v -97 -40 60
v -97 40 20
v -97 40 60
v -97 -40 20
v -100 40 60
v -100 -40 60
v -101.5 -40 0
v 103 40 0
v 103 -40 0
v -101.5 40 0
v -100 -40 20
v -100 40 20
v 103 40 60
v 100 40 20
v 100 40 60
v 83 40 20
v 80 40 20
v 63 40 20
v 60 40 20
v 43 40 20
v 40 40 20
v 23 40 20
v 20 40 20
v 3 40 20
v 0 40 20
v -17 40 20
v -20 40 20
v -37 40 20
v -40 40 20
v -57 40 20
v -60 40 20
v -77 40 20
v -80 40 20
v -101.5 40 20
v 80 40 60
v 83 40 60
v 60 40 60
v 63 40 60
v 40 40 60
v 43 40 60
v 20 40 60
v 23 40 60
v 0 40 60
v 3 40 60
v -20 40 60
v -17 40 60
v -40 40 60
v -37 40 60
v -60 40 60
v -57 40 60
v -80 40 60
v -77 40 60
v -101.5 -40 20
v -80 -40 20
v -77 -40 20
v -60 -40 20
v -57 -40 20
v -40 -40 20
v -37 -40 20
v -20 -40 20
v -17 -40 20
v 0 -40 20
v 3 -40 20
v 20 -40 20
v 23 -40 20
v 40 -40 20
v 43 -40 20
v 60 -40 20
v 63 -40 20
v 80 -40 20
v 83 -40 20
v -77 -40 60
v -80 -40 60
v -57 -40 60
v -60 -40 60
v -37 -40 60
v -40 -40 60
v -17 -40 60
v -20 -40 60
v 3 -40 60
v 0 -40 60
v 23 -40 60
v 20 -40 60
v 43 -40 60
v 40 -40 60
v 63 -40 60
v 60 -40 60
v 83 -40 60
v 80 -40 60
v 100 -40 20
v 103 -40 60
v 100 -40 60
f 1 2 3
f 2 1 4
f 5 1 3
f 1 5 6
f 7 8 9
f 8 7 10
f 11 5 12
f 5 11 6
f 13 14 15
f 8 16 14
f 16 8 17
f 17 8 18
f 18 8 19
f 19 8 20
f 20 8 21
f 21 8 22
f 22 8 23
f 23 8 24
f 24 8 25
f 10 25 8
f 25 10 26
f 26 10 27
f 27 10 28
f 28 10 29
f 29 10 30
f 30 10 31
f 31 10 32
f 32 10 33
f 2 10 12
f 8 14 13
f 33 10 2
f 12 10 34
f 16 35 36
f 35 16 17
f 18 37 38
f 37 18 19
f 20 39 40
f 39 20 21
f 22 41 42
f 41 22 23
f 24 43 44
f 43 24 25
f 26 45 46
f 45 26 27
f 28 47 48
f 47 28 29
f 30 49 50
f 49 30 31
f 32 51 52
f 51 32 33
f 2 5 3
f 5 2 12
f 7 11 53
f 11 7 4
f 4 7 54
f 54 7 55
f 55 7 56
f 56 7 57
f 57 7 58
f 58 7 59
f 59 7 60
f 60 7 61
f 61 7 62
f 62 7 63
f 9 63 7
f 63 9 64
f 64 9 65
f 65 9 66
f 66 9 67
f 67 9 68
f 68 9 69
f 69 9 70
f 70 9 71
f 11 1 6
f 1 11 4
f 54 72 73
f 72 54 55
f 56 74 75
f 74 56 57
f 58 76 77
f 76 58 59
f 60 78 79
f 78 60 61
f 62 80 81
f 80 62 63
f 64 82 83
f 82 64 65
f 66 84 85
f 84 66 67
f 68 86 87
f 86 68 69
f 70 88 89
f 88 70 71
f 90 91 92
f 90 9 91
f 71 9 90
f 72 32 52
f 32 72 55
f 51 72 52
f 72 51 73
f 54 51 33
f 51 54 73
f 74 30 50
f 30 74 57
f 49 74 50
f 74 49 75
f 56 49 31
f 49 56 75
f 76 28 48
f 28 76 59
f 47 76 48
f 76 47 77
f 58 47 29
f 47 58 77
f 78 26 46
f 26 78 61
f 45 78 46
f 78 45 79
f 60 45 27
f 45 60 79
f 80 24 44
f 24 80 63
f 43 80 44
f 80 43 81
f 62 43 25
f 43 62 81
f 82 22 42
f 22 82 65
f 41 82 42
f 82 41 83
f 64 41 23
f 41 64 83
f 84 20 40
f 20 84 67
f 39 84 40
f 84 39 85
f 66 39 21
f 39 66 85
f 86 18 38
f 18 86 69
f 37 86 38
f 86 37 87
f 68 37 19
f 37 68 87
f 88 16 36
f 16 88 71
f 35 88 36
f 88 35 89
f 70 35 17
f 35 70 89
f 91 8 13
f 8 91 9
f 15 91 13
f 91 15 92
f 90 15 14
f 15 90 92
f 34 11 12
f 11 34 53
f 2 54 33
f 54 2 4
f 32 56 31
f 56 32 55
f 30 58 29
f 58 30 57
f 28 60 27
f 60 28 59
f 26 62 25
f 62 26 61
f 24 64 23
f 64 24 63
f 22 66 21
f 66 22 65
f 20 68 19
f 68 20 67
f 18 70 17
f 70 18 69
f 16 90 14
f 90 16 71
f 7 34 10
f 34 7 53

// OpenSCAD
// Petri Dish Rack
// Designed for 90mm diameter dishes standing on edge.

// --- Dimensions ---
base_l      = 203.0;  // Length of base (X)
base_w      = 80.0;   // Width of base (Y)
base_h      = 20.0;   // Height of base (Z)

dish_radius = 45.0;   // Radius of 90mm dish
cradle_r    = 46.0;   // Radius of the cutting cylinder
cradle_z    = 52.0;   // Z-offset of the cylinder axis (bottoms at 52-46=6mm)

num_dividers = 11;     // Number of vertical plates
divider_t    = 3.0;    // Thickness of each divider (X)
divider_h    = 60.0;   // Height of dividers (Z)
divider_w    = 80.0;   // Width of dividers (Y)

// Spacing calculation: 
// 11 dividers create 10 slots. 
// Total length covered by dividers is from -100 to 100.
// The user specified x = -100, -80, ..., 100.
x_start      = -100.0;
x_end        = 100.0;
x_step       = 20.0;

$fn = 128;

// --- Modeling ---

// The base block
module base() {
    translate([-base_l/2, -base_w/2, 0])
        cube([base_l, base_w, base_h]);
}

// The vertical dividers
module dividers() {
    for (i = [0 : num_dividers - 1]) {
        x_pos = x_start + (i * x_step);
        translate([x_pos, -divider_w/2, 0])
            cube([divider_t, divider_w, divider_h]);
    }
}

// The cradle (the curved groove)
// The axis runs along X at y=0, z=52.
// We use a large cylinder to cut the groove.
module cradle_cutter() {
    // We rotate the cylinder to lie along the X axis.
    // The cylinder is centered at y=0, z=52.
    // To use difference, we make it longer than the base.
    translate([0, 0, cradle_z])
        rotate([0, 90, 0])
            cylinder(h = base_l + 2, d = cradle_r * 2);
}

// Final Assembly
union() {
    // The base and dividers are joined
    union() {
        base();
        dividers();
    }
    
    // We use a difference to cut the cradle out of the combined base/dividers
    // However, the prompt says "the cradle is not cut through them" 
    // regarding the dividers, but "A curved cradle... is cut along its whole length".
    // This implies the cradle is a feature of the base, but the dividers 
    // are solid and rise through the cradle area.
    // To achieve "cradle is not cut through them", we must subtract the cradle 
    // from the base ONLY, or subtract the dividers from the cradle.
    // The most robust way: Union(Base, Dividers) then subtract (Cradle INTERSECT Base).
    // Wait, the prompt says: "The cradle is not cut through them [the dividers]".
    // This means the dividers are solid blocks that exist even where the cradle is.
    
    // Correct logic:
    // 1. Create the base.
    // 2. Subtract the cradle from the base.
    // 3. Add the dividers.
}

// Re-structuring to follow the "cradle not cut through dividers" rule strictly:
difference() {
    // Start with the base
    base();
} // This is just a placeholder for the logic below

// Final Construction Logic:
// We want: (Base - Cradle) + Dividers
// This ensures the cradle is only in the base and doesn't cut the dividers.

difference() {
    // The base
    base();
    
    // The cradle cutter (only affects the base)
    // To ensure it only affects the base, we limit its Z range to the base height
    // but the prompt says the cradle bottoms at z=6 and the base is 20mm tall.
    // Since the cradle axis is at z=52 and radius is 46, the bottom is at z=6.
    // The top of the cradle is at 52 + 46 = 98.
    // Since the base is only 20mm tall, the cradle only cuts the top part of the base.
    translate([-base_l/2 - 1, -base_w/2 - 1, 0])
    rotate([0, 90, 0])
    translate([0, 0, -cradle_z])
    cylinder(h = base_l + 2, d = cradle_r * 2);
}

// Now add the dividers on top of the modified base
// Note: The dividers are 60mm tall. The base is 20mm tall.
// The dividers are placed at x = -100 to 100.
// The base is 203mm long (-101.5 to 101.5).
// The dividers are 80mm wide.
// The dividers are NOT cut by the cradle.

// Since we already used 'difference' for the base, we must wrap everything in a union.
// But 'difference' is a top-level operation. Let's rewrite the whole thing.

// --- REWRITTEN ASSEMBLY ---
// (This is the actual code that will render)

// We will use a union of (Base minus Cradle) and (Dividers).

// 1. The Base with the groove
// 2. The Dividers

// Let's define the base-with-groove as a module
module base_with_groove() {
    difference() {
        base();
        // The cradle cutter
        // We translate it so the axis is at y=0, z=52
        // The cylinder is oriented along X.
        translate([-base_l/2 - 1, -base_w/2 - 1, cradle_z])
            rotate([0, 90, 0])
                cylinder(h = base_l + 2, d = cradle_r * 2);
    }
}

// The final part is the union of the grooved base and the solid dividers.
// Note: The dividers are 60mm tall. They start at z=0.
// The base is 20mm tall.
// The dividers are 80mm wide.

union() {
    base_with_groove();
    dividers();
}
